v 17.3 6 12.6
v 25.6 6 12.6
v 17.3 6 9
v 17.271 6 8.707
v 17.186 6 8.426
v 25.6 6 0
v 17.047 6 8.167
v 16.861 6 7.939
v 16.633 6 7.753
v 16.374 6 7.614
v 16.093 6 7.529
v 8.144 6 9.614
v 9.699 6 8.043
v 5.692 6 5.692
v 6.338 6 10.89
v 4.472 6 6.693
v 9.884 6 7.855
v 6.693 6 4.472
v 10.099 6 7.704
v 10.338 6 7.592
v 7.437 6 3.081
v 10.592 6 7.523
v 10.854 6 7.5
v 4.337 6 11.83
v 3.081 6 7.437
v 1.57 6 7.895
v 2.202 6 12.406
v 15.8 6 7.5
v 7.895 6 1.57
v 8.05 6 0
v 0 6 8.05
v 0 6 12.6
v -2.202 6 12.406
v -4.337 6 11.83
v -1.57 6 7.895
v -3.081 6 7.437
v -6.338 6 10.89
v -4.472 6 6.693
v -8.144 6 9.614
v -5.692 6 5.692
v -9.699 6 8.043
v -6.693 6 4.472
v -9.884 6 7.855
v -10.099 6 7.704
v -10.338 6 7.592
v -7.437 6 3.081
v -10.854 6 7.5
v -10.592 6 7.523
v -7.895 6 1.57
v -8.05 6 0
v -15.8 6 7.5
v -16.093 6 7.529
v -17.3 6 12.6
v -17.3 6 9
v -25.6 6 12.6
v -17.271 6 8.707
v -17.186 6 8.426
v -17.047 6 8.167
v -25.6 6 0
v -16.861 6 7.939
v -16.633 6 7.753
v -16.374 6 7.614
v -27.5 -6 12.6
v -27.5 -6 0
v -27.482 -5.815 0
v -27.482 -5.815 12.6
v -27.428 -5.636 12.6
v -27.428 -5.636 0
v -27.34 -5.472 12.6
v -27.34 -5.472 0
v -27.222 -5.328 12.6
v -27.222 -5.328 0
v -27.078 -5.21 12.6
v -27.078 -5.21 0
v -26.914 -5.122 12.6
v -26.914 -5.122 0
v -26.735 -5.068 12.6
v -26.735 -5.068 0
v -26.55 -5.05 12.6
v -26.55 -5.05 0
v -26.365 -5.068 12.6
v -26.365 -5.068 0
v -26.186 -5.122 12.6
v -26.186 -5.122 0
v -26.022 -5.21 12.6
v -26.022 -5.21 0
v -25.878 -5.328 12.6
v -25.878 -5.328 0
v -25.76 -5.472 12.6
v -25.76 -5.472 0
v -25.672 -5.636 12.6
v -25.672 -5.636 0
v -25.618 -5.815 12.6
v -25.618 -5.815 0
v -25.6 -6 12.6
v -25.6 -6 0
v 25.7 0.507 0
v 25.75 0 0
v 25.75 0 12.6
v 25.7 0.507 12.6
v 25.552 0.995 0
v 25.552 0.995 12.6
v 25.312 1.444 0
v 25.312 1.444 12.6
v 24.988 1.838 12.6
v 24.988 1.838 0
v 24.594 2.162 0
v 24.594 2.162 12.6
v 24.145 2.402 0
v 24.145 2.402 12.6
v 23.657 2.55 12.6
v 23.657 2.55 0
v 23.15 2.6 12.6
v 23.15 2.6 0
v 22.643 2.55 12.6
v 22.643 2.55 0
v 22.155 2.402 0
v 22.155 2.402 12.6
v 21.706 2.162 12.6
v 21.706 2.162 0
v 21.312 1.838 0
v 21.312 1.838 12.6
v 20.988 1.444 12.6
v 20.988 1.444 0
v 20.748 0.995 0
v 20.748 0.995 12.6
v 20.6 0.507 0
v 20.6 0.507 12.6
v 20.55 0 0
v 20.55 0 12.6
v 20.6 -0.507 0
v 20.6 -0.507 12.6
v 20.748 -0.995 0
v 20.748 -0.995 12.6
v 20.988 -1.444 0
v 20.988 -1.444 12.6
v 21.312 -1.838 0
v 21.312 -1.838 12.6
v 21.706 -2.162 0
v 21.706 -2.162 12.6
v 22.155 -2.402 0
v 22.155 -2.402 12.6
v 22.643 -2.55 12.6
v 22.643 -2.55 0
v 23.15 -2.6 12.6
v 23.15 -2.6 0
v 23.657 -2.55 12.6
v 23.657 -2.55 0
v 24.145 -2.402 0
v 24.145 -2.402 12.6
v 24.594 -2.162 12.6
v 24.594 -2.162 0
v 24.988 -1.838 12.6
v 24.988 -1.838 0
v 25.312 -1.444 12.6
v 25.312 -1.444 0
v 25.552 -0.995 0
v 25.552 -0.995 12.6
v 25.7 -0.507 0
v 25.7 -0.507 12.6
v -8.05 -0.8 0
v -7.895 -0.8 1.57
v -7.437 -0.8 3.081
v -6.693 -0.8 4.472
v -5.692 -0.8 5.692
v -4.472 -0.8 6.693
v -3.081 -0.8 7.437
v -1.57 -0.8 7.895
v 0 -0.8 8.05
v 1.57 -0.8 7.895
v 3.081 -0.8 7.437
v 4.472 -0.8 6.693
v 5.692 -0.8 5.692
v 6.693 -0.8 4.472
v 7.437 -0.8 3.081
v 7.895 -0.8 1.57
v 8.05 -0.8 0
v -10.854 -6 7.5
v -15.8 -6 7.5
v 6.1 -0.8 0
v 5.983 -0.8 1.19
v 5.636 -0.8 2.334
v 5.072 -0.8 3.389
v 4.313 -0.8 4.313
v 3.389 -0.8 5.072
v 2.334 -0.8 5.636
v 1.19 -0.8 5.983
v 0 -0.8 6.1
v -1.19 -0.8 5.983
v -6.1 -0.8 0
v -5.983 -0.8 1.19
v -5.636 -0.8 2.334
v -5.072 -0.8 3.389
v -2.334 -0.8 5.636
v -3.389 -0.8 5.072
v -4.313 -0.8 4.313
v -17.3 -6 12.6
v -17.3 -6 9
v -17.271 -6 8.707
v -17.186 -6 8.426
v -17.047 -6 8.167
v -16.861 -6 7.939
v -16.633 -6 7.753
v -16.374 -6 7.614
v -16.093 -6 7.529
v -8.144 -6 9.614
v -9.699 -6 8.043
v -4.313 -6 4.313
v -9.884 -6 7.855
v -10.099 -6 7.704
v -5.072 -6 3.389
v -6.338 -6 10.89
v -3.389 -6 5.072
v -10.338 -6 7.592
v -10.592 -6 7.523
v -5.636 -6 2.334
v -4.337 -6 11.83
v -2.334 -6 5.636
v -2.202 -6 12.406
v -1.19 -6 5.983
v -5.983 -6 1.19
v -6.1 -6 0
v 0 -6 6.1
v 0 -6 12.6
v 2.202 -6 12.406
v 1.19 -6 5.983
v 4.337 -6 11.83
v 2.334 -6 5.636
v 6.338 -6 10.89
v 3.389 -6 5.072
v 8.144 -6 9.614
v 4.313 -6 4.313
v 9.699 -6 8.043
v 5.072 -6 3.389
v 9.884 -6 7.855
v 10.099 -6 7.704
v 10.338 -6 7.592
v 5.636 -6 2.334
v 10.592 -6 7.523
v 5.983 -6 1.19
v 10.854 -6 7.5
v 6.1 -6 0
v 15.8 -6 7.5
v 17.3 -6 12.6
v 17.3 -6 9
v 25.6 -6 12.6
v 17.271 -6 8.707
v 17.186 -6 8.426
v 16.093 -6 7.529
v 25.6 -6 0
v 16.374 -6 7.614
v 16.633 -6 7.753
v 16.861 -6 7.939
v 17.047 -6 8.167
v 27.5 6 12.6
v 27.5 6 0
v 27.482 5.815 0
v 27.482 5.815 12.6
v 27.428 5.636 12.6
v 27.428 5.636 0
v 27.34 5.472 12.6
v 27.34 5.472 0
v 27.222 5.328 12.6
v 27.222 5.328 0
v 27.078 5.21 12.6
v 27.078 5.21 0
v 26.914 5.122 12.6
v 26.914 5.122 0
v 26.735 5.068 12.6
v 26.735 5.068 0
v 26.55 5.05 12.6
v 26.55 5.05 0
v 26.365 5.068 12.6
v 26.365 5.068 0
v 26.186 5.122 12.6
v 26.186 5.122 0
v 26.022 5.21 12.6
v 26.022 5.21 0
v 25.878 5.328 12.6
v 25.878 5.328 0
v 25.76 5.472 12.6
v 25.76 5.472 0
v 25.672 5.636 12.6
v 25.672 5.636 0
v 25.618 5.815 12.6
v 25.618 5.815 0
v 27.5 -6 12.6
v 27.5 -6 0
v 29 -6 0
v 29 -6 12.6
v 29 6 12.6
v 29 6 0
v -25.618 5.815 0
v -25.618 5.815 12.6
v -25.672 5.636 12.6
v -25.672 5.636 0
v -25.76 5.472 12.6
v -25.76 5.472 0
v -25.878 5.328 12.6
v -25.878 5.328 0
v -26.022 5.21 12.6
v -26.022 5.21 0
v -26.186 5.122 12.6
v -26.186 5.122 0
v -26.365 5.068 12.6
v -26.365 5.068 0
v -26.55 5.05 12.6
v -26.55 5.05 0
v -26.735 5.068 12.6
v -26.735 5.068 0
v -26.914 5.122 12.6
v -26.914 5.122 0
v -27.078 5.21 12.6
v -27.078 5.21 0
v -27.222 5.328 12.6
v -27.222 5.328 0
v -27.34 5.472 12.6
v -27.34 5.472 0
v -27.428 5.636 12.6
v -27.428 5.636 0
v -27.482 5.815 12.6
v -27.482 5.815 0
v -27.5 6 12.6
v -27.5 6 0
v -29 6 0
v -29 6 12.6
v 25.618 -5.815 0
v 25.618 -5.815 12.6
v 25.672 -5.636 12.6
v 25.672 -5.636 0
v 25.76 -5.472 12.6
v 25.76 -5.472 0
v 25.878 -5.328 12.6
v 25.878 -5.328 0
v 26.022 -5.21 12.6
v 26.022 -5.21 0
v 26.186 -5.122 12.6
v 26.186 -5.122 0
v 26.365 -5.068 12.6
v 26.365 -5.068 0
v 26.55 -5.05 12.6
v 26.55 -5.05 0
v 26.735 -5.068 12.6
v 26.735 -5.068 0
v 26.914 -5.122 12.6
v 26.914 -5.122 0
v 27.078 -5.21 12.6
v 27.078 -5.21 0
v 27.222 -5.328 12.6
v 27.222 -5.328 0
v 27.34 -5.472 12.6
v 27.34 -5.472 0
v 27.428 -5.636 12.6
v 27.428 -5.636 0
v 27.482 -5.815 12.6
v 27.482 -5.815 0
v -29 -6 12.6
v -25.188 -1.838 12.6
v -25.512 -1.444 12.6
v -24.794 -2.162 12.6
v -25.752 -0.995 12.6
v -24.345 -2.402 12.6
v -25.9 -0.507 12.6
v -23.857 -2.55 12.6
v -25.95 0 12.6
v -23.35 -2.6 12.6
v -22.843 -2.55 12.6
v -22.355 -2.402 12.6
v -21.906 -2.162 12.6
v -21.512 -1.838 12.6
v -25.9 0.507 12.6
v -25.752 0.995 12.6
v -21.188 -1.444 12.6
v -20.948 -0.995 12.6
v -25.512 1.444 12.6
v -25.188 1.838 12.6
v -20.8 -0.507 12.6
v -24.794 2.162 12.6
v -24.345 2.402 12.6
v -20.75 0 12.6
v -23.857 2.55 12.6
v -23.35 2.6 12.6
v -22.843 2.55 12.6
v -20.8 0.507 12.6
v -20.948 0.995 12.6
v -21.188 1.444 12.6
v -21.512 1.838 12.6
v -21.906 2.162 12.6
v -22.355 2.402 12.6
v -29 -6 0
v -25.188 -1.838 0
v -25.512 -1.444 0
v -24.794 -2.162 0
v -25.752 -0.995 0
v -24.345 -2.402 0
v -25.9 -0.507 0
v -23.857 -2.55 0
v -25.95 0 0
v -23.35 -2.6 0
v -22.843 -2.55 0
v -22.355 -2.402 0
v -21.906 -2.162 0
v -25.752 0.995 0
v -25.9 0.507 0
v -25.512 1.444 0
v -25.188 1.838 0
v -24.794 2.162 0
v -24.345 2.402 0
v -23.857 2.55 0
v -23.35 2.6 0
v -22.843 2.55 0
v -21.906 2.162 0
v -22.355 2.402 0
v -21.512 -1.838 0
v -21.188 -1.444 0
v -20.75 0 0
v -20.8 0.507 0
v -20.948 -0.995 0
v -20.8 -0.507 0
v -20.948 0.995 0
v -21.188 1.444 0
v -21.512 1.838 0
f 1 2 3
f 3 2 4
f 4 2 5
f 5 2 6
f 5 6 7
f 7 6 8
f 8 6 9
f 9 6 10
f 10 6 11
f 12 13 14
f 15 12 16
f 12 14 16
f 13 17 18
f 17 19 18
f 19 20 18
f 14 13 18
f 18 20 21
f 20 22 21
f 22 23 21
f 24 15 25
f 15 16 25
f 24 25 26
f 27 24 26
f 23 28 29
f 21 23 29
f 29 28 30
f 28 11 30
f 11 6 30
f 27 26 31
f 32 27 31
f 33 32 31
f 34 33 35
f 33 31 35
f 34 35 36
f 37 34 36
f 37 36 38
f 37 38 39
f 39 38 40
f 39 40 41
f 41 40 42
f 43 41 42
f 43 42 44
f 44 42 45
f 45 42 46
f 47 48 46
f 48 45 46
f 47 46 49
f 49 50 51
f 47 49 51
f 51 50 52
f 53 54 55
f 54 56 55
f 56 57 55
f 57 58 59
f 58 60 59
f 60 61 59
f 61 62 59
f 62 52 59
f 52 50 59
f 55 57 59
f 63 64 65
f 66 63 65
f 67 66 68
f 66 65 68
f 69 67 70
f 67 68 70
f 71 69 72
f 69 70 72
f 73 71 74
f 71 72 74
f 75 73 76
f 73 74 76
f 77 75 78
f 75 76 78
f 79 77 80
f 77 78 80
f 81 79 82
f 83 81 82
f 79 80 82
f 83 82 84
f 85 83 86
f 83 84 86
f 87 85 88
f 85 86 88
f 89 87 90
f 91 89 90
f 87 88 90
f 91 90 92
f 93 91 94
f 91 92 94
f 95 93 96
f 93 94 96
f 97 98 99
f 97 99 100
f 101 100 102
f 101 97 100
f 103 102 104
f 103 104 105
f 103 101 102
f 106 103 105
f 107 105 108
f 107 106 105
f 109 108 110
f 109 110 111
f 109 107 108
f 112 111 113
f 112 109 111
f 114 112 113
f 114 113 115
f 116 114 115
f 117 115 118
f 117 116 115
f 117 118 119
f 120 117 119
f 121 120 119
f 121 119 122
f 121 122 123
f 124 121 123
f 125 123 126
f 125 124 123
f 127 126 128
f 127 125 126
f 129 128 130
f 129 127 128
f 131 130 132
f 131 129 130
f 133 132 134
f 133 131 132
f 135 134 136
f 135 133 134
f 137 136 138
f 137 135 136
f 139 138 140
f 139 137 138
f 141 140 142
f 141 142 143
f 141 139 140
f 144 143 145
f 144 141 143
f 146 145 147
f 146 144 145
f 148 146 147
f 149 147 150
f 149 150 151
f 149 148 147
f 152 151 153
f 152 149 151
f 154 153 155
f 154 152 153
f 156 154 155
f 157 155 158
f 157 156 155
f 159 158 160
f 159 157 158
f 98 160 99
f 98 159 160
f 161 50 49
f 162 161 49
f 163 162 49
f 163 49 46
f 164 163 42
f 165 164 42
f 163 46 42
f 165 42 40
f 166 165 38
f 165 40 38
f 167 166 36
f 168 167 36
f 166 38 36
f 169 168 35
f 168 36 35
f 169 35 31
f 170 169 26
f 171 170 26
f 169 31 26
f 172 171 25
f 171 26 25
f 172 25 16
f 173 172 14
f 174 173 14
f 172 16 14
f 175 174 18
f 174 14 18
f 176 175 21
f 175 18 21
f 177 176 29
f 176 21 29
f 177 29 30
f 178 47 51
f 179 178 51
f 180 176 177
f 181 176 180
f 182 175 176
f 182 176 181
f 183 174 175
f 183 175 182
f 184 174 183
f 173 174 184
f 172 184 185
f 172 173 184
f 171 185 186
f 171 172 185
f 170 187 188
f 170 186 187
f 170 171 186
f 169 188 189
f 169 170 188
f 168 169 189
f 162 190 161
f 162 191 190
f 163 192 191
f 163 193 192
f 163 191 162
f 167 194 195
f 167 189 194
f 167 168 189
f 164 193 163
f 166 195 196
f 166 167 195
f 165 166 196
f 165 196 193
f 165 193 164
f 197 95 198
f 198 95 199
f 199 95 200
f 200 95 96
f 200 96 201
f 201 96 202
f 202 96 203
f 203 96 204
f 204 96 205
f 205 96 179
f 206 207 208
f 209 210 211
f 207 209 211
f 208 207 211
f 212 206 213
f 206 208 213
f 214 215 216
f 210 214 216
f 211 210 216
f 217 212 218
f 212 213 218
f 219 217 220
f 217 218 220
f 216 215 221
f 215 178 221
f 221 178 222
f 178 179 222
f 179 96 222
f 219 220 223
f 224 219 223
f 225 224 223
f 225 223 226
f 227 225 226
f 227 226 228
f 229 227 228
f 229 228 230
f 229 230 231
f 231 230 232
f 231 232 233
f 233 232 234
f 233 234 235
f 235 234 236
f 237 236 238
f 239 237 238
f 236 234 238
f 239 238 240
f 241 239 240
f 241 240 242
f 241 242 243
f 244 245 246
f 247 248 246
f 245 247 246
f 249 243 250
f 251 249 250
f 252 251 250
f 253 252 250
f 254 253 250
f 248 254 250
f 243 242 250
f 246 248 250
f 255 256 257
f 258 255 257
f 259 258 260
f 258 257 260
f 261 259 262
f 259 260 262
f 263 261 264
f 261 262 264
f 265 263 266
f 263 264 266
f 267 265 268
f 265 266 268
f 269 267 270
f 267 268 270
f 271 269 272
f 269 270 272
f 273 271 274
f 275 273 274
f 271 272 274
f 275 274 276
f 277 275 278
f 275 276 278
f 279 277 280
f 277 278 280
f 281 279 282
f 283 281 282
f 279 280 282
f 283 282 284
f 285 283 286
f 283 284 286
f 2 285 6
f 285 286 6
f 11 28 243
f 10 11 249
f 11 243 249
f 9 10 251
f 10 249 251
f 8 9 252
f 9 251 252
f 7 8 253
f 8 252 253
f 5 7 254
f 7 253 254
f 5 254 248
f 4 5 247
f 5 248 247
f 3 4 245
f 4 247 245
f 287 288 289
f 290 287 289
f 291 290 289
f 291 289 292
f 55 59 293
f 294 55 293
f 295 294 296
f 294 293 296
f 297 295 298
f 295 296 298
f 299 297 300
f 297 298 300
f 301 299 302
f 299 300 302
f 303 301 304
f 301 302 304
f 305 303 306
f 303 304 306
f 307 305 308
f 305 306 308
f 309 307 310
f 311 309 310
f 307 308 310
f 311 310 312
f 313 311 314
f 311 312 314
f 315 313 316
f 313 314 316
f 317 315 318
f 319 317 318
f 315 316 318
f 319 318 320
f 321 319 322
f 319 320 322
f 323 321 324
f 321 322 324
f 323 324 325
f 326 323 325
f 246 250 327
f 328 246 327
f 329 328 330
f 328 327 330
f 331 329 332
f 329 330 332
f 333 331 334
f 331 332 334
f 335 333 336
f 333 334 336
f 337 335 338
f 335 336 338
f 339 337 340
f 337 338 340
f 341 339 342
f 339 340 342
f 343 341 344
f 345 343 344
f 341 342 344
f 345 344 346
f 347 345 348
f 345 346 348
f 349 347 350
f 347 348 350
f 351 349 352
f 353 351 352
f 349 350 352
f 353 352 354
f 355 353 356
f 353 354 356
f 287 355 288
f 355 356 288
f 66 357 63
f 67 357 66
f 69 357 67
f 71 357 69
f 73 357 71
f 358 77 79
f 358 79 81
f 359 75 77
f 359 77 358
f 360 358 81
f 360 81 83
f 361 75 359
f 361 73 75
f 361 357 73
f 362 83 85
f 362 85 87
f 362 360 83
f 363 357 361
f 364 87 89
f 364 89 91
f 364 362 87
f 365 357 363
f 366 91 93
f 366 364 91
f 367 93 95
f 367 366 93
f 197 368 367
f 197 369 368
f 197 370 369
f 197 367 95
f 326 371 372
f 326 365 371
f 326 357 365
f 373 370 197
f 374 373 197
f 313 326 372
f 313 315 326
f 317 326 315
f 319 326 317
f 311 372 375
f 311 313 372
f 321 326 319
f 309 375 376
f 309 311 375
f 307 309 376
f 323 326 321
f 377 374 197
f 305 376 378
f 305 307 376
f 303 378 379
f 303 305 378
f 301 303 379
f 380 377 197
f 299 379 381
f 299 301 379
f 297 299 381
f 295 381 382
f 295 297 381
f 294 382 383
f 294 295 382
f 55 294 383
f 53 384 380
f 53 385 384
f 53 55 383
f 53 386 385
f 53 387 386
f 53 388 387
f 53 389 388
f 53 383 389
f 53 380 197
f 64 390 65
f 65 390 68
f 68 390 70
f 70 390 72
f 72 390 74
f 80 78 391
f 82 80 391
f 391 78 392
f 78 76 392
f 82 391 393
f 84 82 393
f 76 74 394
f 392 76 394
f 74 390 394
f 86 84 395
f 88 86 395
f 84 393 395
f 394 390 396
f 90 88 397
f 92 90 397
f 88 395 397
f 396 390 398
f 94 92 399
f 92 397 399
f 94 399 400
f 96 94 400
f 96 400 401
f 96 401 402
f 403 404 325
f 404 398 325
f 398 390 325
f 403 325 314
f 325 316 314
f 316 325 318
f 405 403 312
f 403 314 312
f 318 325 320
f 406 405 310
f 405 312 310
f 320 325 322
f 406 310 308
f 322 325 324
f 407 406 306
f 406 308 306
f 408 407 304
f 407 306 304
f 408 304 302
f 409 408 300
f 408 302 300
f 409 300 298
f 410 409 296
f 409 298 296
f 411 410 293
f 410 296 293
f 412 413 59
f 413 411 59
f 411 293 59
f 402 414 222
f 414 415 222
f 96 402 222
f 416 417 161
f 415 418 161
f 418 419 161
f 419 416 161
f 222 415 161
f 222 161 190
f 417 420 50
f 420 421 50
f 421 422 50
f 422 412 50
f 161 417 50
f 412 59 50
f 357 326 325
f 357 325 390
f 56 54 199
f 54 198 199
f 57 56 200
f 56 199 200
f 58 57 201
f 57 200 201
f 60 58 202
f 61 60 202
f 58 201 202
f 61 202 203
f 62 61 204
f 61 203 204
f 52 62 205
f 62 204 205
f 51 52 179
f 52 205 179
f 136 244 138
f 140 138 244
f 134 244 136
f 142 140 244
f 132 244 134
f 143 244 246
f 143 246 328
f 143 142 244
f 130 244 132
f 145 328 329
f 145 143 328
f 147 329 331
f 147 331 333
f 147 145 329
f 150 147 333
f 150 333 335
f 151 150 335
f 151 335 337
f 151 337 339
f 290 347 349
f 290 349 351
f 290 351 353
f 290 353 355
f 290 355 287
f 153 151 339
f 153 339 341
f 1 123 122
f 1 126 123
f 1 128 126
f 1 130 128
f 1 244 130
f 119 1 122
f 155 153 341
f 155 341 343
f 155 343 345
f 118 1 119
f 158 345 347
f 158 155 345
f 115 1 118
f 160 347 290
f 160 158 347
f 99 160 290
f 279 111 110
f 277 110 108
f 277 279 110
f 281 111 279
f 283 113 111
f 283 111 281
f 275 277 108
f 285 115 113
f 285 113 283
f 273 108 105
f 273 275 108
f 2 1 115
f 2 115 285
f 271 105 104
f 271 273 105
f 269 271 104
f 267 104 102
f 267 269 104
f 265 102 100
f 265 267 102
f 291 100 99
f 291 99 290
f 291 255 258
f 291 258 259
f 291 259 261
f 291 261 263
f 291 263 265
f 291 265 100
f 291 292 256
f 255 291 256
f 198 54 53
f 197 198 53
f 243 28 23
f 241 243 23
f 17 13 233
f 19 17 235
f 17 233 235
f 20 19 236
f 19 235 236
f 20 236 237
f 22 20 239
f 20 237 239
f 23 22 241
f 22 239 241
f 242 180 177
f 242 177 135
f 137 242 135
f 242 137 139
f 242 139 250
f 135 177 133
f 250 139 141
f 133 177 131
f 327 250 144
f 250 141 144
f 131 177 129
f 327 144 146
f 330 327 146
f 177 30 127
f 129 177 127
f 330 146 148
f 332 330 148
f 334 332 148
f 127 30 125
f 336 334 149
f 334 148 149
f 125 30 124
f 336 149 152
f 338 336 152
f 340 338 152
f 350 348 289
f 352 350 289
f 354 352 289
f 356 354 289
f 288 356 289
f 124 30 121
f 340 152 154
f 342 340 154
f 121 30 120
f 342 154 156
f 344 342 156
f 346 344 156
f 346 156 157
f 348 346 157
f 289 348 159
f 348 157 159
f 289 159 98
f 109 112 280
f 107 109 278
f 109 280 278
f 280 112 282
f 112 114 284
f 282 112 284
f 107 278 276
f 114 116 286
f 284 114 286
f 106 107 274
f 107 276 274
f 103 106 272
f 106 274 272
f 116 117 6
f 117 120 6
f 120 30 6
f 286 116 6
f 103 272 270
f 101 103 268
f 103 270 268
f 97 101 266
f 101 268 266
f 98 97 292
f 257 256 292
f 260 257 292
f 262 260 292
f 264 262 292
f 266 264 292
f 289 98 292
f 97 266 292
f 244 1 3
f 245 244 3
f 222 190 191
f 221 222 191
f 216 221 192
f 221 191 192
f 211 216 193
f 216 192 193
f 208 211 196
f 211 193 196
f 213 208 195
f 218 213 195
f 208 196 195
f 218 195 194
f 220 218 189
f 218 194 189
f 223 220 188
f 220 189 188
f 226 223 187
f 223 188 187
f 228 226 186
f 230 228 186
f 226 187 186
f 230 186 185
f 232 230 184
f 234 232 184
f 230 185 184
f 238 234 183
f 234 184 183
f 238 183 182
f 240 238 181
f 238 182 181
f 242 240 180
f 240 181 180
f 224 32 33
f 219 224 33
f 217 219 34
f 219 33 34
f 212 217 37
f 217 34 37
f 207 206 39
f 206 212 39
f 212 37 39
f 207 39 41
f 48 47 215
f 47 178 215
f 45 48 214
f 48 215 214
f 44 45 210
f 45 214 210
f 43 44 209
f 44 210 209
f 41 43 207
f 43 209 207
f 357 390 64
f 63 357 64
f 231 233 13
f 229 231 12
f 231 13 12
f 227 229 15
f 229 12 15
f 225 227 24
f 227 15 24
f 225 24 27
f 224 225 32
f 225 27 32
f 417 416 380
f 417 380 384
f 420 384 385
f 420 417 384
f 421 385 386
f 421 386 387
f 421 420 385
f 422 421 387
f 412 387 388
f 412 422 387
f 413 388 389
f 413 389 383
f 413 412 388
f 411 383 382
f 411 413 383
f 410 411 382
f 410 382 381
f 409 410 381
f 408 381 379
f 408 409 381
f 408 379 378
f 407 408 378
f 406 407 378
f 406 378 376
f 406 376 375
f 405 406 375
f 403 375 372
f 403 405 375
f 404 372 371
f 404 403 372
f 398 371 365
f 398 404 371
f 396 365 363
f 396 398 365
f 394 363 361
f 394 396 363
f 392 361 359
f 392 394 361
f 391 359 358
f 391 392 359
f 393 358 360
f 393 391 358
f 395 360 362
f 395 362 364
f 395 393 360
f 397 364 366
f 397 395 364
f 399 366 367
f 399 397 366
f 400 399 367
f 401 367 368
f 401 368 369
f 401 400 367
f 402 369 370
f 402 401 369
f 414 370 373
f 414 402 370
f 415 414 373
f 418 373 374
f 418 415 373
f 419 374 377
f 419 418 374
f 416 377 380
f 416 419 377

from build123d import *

# Parameters (mm, degrees)
F0_R      = 2.6
F1_DEPTH  = 12.6
F2_R      = 6.1
F3_DEPTH  = 13
F2_R_2    = 8.05
F4_DEPTH  = 6.8
F7_ANGLE  = 180
F10_DEPTH = 13
F11_R     = 1.5


with BuildPart() as f1:
    # F0 (on Top) → F1 (new body)
    with BuildSketch(Plane.XY):
        with BuildLine():
            Line((-27.5, 6), (-29, 6))
            Line((-29, 6), (-29, -6))
            Line((-29, -6), (-27.5, -6))
            ThreePointArc((-27.5, -6), (-26.55, -5.05), (-25.6, -6))
            Line((-25.6, -6), (25.6, -6))
            ThreePointArc((25.6, -6), (26.55, -5.05), (27.5, -6))
            Line((27.5, -6), (29, -6))
            Line((29, -6), (29, 6))
            Line((29, 6), (27.5, 6))
            ThreePointArc((27.5, 6), (26.55, 5.05), (25.6, 6))
            Line((25.6, 6), (-25.6, 6))
            ThreePointArc((-25.6, 6), (-26.55, 5.05), (-27.5, 6))
        make_face()
        with Locations((-23.35, 0)):
            Circle(F0_R, mode=Mode.SUBTRACT)
        with Locations((23.15, 0)):
            Circle(F0_R, mode=Mode.SUBTRACT)
    extrude(amount=F1_DEPTH)

    # F2 (on face) → F3 (cut)
    with BuildSketch(Plane(origin=(0, 6, 0), x_dir=(-1, 0, 0), z_dir=(0, 1, 0))):
        Circle(F2_R)
    extrude(amount=-F3_DEPTH, mode=Mode.SUBTRACT)

    # F2 (on face) → F4 (cut)
    with BuildSketch(Plane(origin=(0, 6, 0), x_dir=(-1, 0, 0), z_dir=(0, 1, 0))):
        Circle(F2_R_2)
        Circle(F2_R, mode=Mode.SUBTRACT)
    extrude(amount=-F4_DEPTH, mode=Mode.SUBTRACT)

    # F9 (on face) → F10 (cut)
    with BuildSketch(Plane(origin=(0, 6, 0), x_dir=(-1, 0, 0), z_dir=(0, 1, 0))):
        with BuildLine():
            Line((-17.3, 7.5), (-10.124722, 7.5))
            ThreePointArc((-10.124722, 7.5), (-5.668333, 11.253), (0, 12.6))
            Line((0, 12.6), (-17.3, 12.6))
            Line((-17.3, 12.6), (-17.3, 7.5))
        make_face()
        with BuildLine():
            ThreePointArc((0, 12.6), (5.668333, 11.253), (10.124722, 7.5))
            Line((10.124722, 7.5), (17.3, 7.5))
            Line((17.3, 7.5), (17.3, 12.6))
            Line((17.3, 12.6), (0, 12.6))
        make_face()
    extrude(amount=-F10_DEPTH, mode=Mode.SUBTRACT)

    # F11
    f11_edges = [f1.edges().sort_by_distance(p)[0] for p in [
        (17.3, 0, 7.5),
        (10.124722, 0, 7.5),
        (-10.124722, 0, 7.5),
        (-17.3, 0, 7.5),
    ]]
    fillet(f11_edges, radius=F11_R)


with BuildPart() as f5_1:
    # F5: copy of F1
    add(f1.part)


with BuildPart() as f7_1:
    # F7: copy of F1
    add(f1.part.rotate(Axis((0, 1.422519, 0), (0, 1, 0)), F7_ANGLE))


solid = f1.part
